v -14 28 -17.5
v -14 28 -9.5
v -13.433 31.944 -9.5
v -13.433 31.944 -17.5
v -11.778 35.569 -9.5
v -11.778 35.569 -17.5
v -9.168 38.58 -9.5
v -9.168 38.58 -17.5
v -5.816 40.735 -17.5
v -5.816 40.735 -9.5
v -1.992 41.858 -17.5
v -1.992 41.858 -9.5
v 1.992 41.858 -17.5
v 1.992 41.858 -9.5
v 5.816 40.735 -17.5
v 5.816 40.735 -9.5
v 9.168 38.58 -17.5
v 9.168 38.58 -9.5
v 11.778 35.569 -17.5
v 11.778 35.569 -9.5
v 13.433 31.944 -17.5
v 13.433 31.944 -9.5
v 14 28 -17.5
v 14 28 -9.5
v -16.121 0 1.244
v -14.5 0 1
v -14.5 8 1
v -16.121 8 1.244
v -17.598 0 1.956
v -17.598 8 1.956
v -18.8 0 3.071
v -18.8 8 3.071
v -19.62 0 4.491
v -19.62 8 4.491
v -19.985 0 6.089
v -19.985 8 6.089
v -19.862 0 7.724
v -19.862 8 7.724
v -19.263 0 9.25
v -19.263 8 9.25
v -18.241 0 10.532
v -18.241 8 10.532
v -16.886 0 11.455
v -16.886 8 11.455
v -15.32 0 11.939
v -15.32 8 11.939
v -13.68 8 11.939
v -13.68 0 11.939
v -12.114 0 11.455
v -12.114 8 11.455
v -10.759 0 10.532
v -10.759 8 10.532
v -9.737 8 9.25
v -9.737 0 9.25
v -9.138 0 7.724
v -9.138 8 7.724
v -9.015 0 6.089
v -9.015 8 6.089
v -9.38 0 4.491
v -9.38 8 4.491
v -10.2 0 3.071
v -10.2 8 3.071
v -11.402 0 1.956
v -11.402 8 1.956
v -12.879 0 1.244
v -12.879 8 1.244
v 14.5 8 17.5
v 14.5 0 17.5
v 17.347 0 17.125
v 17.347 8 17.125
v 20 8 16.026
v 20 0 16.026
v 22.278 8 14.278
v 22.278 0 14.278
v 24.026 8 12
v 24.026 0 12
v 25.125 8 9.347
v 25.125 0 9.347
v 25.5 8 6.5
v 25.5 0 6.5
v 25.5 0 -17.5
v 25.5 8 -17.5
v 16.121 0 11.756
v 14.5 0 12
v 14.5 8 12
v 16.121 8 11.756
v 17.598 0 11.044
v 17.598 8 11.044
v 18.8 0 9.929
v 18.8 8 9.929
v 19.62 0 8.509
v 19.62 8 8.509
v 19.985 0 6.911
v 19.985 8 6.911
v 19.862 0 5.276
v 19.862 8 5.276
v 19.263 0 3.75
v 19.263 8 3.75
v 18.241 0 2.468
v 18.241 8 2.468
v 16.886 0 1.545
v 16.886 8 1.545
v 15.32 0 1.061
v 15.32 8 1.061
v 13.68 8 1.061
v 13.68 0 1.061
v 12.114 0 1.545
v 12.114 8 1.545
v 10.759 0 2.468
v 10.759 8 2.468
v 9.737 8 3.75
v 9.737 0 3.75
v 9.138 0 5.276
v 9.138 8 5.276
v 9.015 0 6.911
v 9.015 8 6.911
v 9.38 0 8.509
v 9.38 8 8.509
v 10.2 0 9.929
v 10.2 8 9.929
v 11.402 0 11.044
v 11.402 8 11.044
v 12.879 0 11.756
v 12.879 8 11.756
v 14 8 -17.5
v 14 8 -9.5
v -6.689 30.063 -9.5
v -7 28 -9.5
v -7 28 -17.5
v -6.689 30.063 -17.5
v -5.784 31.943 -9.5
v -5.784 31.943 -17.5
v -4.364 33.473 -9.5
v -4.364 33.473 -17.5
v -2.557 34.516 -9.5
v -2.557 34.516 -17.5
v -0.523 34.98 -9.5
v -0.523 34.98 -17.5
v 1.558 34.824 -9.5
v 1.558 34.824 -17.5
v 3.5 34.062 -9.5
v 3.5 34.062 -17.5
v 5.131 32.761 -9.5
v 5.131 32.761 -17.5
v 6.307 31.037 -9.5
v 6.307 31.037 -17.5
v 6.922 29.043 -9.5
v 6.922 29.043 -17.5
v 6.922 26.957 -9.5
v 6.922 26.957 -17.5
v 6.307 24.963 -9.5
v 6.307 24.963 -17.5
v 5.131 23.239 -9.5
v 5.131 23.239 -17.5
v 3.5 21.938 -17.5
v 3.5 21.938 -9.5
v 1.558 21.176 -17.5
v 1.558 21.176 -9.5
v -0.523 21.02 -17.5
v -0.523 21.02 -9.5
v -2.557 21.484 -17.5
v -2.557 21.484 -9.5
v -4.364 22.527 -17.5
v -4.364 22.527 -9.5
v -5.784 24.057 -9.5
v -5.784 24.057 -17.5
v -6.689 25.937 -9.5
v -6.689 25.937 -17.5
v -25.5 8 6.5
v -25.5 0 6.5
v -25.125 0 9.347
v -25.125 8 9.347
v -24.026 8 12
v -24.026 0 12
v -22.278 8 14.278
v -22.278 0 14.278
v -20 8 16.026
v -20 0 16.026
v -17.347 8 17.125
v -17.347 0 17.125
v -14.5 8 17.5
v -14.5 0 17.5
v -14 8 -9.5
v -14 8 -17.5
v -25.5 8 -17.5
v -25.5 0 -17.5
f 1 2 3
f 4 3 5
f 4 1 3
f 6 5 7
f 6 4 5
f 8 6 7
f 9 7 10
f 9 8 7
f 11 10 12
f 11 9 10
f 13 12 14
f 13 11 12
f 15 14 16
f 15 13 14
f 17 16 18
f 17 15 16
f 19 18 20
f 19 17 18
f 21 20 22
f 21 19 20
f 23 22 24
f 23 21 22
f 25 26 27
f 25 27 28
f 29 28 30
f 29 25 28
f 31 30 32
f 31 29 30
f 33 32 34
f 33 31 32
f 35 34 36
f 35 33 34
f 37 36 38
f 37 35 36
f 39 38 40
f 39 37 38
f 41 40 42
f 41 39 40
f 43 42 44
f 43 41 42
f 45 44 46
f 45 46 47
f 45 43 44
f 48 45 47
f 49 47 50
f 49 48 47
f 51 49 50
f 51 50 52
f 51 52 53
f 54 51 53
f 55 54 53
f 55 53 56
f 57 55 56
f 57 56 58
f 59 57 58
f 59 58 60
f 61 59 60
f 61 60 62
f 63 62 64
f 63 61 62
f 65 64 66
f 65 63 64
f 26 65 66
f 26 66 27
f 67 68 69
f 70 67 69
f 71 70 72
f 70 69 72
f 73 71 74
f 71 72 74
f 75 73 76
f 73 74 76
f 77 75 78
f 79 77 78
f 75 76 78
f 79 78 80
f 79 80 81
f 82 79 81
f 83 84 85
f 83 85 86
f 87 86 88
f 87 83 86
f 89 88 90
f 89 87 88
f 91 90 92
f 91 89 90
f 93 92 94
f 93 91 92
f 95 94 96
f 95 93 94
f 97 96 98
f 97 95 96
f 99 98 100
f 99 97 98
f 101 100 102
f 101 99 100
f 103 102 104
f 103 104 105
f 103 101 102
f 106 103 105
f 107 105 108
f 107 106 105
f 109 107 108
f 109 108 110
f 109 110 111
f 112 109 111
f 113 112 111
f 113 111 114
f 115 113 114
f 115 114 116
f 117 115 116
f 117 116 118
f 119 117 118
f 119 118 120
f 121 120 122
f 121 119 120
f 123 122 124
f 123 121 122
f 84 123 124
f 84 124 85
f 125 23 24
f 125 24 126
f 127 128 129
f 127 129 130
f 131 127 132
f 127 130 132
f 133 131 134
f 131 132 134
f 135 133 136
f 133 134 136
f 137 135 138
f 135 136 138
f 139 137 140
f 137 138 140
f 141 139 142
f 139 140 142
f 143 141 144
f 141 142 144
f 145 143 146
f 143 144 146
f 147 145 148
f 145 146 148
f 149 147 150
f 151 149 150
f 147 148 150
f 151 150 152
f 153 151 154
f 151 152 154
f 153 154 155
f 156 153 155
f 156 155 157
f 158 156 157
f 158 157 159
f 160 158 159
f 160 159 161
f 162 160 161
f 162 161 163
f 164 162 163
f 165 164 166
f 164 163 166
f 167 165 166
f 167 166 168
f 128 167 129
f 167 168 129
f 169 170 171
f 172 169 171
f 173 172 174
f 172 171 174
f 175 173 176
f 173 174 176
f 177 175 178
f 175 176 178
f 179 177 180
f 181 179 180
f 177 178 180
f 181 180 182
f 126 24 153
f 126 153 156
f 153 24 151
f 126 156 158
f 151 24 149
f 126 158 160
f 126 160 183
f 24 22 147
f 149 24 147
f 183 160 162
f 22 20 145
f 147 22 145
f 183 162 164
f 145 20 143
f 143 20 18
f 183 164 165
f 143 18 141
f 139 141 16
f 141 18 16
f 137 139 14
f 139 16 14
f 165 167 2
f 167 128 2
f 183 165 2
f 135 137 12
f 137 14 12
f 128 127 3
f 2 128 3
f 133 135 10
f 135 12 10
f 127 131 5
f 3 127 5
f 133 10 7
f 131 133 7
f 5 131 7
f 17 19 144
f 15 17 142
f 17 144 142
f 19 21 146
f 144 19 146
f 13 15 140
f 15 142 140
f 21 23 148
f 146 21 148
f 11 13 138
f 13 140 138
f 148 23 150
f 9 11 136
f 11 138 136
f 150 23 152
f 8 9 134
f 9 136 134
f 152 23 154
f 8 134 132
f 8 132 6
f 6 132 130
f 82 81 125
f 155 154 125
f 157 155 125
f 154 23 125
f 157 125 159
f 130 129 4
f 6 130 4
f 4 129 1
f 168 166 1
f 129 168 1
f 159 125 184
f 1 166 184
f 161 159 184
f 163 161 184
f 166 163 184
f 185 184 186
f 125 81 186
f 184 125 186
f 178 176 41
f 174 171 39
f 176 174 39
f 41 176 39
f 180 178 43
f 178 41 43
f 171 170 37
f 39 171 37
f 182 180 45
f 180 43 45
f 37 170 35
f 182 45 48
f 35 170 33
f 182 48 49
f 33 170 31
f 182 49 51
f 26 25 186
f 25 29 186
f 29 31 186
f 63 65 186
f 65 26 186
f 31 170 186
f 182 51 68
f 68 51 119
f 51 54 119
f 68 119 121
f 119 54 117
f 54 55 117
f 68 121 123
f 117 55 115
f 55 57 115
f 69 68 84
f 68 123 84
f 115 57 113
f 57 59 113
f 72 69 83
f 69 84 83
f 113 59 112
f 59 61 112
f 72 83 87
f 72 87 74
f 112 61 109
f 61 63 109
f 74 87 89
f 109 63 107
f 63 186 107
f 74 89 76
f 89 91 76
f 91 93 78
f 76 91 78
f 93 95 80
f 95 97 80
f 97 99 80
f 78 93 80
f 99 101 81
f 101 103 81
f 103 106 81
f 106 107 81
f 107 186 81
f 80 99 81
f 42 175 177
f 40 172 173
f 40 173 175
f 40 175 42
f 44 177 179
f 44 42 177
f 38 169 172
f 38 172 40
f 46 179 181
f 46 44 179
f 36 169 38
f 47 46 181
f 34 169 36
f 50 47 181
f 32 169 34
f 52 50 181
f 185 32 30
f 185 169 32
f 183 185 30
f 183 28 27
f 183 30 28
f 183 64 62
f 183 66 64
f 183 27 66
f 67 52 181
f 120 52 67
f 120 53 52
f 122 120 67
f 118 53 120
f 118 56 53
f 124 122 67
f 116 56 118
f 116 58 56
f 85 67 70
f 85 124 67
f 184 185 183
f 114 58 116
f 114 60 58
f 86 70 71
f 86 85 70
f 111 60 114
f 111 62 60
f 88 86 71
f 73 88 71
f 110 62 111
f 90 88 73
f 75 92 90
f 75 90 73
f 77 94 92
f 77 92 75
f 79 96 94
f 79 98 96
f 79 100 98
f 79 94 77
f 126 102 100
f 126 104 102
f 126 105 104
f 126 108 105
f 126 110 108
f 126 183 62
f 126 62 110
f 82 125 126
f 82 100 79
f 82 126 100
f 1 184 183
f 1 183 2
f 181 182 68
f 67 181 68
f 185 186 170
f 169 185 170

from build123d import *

# Parameters (mm, degrees)
SKETCH_1_R      = 5.5
EXTRUDE_1_DEPTH = 8
SKETCH_2_R      = 7
EXTRUDE_2_DEPTH = 8


with BuildPart() as part:
    # 草图1 → 凸台-拉伸1 (new body)
    with BuildSketch(Plane(origin=(0, 0, 0), x_dir=(1, 0, 0), z_dir=(0, 1, 0))):
        with BuildLine():
            Line((-14.5, -17.5), (14.5, -17.5))
            ThreePointArc((14.5, -17.5), (22.278174593, -14.278174593), (25.5, -6.5))
            Line((25.5, -6.5), (25.5, 17.5))
            Line((25.5, 17.5), (-25.5, 17.5))
            Line((-25.5, 17.5), (-25.5, -6.5))
            ThreePointArc((-25.5, -6.5), (-22.278174593, -14.278174593), (-14.5, -17.5))
        make_face()
        with Locations(Location((14.5, -6.5, 0), (0, 0, 270))):
            Circle(SKETCH_1_R, mode=Mode.SUBTRACT)
        with Locations(Location((-14.5, -6.5, 0), (0, 0, 90))):
            Circle(SKETCH_1_R, mode=Mode.SUBTRACT)
    extrude(amount=EXTRUDE_1_DEPTH)

    # 草图2 → 凸台-拉伸2 (add)
    with BuildSketch(Plane(origin=(0, 0, -17.5), x_dir=(-1, 0, 0), z_dir=(0, 0, -1))):
        with BuildLine():
            Line((-14, 8), (14, 8))
            Line((14, 8), (14, 28))
            ThreePointArc((14, 28), (0, 42), (-14, 28))
            Line((-14, 28), (-14, 8))
        make_face()
        with Locations((0, 28)):
            Circle(SKETCH_2_R, mode=Mode.SUBTRACT)
    extrude(amount=-EXTRUDE_2_DEPTH)


solid = part.part
